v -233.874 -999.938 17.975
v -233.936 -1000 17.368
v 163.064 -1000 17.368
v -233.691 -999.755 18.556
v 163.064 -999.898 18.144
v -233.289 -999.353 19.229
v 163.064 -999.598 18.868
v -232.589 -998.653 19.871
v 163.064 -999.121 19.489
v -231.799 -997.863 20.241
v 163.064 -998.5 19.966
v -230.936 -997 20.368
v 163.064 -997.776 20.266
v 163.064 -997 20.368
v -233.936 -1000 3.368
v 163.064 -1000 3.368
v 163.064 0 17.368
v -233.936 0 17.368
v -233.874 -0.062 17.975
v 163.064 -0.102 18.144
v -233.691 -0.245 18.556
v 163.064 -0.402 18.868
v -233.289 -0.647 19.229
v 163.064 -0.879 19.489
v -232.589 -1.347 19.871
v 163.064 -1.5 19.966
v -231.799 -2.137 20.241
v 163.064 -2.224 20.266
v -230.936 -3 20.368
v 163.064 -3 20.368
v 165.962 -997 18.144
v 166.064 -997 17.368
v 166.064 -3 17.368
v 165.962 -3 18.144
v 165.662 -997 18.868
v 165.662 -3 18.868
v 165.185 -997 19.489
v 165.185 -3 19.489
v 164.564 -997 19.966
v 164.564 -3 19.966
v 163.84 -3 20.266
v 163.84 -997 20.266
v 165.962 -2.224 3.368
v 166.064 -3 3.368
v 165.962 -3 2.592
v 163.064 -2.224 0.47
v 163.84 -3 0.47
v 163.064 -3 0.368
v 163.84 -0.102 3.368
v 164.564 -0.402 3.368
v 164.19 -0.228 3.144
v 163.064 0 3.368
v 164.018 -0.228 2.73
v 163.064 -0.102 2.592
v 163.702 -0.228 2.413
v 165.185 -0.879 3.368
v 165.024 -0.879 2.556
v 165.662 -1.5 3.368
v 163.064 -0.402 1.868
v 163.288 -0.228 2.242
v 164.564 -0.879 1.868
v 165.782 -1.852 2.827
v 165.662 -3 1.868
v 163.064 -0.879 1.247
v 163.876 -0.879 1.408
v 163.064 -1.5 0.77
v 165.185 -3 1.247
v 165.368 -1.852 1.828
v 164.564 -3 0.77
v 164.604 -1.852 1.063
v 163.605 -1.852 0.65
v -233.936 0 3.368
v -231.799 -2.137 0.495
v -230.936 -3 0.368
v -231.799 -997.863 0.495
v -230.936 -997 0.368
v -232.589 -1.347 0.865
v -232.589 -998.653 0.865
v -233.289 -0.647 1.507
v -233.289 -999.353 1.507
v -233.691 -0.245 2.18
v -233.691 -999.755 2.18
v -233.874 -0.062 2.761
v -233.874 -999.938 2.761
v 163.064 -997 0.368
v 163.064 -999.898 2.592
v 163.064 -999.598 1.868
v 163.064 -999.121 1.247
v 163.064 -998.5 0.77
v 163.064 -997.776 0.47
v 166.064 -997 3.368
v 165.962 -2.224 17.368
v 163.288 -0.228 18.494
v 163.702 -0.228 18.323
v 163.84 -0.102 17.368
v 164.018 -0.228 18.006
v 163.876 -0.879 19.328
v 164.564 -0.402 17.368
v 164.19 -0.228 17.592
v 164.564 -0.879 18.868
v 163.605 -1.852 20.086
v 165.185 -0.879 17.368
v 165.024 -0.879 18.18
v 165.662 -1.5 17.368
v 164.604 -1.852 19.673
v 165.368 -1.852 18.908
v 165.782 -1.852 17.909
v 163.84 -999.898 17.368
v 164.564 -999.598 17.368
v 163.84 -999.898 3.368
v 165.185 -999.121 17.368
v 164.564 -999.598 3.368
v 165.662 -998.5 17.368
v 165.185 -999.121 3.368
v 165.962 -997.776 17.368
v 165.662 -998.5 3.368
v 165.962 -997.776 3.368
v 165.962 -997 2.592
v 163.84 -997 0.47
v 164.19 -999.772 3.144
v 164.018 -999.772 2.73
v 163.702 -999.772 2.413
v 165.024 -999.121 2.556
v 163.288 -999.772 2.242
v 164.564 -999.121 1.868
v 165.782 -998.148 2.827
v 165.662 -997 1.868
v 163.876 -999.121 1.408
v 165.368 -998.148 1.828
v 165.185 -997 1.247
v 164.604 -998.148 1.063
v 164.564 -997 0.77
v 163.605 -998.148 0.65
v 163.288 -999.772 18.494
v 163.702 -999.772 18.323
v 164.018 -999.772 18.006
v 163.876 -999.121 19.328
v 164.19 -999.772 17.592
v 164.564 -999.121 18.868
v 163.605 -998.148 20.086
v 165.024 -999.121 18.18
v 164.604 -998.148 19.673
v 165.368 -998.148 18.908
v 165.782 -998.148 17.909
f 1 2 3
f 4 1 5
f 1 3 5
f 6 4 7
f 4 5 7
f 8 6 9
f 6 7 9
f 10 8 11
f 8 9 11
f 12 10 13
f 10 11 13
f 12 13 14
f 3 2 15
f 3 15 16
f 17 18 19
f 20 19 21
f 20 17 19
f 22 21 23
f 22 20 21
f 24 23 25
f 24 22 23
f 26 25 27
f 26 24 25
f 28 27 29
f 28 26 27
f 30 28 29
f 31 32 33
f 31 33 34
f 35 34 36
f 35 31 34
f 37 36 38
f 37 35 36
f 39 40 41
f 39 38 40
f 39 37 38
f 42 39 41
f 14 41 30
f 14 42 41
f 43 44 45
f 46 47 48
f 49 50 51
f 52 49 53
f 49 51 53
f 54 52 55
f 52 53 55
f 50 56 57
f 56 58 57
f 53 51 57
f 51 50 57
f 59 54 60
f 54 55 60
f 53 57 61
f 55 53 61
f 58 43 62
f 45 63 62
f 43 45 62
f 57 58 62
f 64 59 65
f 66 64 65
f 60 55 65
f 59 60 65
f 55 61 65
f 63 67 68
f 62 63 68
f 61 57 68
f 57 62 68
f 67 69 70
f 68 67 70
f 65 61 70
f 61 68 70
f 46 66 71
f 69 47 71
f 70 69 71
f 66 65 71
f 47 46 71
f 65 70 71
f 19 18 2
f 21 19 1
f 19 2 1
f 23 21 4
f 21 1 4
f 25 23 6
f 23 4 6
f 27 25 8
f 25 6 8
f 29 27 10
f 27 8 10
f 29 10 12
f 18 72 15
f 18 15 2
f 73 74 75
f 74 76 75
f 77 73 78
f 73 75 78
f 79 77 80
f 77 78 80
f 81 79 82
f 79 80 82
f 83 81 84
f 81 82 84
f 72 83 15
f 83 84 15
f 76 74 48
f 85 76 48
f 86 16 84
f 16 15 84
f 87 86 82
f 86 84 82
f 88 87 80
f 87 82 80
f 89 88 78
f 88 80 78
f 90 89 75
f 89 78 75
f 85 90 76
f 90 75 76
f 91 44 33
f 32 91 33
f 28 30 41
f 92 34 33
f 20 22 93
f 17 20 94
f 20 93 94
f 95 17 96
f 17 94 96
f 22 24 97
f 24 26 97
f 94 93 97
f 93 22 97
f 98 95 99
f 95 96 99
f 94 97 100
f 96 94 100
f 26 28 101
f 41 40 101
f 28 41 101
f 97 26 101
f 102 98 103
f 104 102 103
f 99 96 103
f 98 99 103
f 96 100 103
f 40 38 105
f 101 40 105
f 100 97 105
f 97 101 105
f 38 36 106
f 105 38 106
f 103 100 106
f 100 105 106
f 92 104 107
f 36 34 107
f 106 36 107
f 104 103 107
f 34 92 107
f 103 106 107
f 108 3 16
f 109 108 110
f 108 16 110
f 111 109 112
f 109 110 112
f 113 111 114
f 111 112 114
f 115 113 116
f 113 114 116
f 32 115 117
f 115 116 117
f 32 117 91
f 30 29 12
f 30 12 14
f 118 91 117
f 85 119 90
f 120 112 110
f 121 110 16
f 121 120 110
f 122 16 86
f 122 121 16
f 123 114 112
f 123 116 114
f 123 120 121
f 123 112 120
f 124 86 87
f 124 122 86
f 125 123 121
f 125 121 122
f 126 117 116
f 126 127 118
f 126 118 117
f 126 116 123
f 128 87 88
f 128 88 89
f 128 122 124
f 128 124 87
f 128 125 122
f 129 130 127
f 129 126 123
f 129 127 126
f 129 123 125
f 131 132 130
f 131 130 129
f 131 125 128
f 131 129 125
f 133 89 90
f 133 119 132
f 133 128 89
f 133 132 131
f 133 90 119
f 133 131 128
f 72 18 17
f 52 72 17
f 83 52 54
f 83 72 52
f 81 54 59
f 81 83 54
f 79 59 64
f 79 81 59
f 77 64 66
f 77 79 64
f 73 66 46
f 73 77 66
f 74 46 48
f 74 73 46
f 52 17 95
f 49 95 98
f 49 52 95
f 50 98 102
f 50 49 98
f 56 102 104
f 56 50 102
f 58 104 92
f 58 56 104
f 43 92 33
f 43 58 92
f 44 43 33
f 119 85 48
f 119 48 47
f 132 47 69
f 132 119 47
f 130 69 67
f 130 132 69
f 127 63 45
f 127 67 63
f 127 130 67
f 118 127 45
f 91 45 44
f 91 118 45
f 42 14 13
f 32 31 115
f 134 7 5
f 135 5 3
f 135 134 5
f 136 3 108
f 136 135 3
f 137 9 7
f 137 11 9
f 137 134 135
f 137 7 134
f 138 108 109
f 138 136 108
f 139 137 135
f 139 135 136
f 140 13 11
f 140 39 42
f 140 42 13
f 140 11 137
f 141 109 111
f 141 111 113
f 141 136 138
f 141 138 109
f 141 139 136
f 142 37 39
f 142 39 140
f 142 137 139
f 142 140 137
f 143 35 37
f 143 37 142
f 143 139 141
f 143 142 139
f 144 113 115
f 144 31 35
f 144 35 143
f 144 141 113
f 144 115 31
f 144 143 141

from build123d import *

# Parameters (mm, degrees)
F0_W     = 400
F0_H     = 20
F1_DEPTH = 1000
F2_R     = 3
F3_R     = 3


with BuildPart() as f1:
    # F0 (on Front) → F1 (new body)
    with BuildSketch(Plane.XZ):
        with Locations((-33.936166, 10.367986)):
            Rectangle(F0_W, F0_H)
    extrude(amount=F1_DEPTH)

    # F2
    f2_edges = [f1.edges().sort_by_distance(p)[0] for p in [
        (166.063834, -500, 20.367986),
        (166.063834, -500, 0.367986),
    ]]
    fillet(f2_edges, radius=F2_R)

    # F3
    f3_edges = [f1.edges().sort_by_distance(p)[0] for p in [
        (-35.436166, 0, 20.367986),
        (163.063834, -500, 20.367986),
        (-233.936166, -500, 20.367986),
        (-35.436166, -1000, 20.367986),
        (-35.436166, 0, 0.367986),
        (163.063834, -500, 0.367986),
        (-233.936166, -500, 0.367986),
        (-35.436166, -1000, 0.367986),
    ]]
    fillet(f3_edges, radius=F3_R)


solid = f1.part
